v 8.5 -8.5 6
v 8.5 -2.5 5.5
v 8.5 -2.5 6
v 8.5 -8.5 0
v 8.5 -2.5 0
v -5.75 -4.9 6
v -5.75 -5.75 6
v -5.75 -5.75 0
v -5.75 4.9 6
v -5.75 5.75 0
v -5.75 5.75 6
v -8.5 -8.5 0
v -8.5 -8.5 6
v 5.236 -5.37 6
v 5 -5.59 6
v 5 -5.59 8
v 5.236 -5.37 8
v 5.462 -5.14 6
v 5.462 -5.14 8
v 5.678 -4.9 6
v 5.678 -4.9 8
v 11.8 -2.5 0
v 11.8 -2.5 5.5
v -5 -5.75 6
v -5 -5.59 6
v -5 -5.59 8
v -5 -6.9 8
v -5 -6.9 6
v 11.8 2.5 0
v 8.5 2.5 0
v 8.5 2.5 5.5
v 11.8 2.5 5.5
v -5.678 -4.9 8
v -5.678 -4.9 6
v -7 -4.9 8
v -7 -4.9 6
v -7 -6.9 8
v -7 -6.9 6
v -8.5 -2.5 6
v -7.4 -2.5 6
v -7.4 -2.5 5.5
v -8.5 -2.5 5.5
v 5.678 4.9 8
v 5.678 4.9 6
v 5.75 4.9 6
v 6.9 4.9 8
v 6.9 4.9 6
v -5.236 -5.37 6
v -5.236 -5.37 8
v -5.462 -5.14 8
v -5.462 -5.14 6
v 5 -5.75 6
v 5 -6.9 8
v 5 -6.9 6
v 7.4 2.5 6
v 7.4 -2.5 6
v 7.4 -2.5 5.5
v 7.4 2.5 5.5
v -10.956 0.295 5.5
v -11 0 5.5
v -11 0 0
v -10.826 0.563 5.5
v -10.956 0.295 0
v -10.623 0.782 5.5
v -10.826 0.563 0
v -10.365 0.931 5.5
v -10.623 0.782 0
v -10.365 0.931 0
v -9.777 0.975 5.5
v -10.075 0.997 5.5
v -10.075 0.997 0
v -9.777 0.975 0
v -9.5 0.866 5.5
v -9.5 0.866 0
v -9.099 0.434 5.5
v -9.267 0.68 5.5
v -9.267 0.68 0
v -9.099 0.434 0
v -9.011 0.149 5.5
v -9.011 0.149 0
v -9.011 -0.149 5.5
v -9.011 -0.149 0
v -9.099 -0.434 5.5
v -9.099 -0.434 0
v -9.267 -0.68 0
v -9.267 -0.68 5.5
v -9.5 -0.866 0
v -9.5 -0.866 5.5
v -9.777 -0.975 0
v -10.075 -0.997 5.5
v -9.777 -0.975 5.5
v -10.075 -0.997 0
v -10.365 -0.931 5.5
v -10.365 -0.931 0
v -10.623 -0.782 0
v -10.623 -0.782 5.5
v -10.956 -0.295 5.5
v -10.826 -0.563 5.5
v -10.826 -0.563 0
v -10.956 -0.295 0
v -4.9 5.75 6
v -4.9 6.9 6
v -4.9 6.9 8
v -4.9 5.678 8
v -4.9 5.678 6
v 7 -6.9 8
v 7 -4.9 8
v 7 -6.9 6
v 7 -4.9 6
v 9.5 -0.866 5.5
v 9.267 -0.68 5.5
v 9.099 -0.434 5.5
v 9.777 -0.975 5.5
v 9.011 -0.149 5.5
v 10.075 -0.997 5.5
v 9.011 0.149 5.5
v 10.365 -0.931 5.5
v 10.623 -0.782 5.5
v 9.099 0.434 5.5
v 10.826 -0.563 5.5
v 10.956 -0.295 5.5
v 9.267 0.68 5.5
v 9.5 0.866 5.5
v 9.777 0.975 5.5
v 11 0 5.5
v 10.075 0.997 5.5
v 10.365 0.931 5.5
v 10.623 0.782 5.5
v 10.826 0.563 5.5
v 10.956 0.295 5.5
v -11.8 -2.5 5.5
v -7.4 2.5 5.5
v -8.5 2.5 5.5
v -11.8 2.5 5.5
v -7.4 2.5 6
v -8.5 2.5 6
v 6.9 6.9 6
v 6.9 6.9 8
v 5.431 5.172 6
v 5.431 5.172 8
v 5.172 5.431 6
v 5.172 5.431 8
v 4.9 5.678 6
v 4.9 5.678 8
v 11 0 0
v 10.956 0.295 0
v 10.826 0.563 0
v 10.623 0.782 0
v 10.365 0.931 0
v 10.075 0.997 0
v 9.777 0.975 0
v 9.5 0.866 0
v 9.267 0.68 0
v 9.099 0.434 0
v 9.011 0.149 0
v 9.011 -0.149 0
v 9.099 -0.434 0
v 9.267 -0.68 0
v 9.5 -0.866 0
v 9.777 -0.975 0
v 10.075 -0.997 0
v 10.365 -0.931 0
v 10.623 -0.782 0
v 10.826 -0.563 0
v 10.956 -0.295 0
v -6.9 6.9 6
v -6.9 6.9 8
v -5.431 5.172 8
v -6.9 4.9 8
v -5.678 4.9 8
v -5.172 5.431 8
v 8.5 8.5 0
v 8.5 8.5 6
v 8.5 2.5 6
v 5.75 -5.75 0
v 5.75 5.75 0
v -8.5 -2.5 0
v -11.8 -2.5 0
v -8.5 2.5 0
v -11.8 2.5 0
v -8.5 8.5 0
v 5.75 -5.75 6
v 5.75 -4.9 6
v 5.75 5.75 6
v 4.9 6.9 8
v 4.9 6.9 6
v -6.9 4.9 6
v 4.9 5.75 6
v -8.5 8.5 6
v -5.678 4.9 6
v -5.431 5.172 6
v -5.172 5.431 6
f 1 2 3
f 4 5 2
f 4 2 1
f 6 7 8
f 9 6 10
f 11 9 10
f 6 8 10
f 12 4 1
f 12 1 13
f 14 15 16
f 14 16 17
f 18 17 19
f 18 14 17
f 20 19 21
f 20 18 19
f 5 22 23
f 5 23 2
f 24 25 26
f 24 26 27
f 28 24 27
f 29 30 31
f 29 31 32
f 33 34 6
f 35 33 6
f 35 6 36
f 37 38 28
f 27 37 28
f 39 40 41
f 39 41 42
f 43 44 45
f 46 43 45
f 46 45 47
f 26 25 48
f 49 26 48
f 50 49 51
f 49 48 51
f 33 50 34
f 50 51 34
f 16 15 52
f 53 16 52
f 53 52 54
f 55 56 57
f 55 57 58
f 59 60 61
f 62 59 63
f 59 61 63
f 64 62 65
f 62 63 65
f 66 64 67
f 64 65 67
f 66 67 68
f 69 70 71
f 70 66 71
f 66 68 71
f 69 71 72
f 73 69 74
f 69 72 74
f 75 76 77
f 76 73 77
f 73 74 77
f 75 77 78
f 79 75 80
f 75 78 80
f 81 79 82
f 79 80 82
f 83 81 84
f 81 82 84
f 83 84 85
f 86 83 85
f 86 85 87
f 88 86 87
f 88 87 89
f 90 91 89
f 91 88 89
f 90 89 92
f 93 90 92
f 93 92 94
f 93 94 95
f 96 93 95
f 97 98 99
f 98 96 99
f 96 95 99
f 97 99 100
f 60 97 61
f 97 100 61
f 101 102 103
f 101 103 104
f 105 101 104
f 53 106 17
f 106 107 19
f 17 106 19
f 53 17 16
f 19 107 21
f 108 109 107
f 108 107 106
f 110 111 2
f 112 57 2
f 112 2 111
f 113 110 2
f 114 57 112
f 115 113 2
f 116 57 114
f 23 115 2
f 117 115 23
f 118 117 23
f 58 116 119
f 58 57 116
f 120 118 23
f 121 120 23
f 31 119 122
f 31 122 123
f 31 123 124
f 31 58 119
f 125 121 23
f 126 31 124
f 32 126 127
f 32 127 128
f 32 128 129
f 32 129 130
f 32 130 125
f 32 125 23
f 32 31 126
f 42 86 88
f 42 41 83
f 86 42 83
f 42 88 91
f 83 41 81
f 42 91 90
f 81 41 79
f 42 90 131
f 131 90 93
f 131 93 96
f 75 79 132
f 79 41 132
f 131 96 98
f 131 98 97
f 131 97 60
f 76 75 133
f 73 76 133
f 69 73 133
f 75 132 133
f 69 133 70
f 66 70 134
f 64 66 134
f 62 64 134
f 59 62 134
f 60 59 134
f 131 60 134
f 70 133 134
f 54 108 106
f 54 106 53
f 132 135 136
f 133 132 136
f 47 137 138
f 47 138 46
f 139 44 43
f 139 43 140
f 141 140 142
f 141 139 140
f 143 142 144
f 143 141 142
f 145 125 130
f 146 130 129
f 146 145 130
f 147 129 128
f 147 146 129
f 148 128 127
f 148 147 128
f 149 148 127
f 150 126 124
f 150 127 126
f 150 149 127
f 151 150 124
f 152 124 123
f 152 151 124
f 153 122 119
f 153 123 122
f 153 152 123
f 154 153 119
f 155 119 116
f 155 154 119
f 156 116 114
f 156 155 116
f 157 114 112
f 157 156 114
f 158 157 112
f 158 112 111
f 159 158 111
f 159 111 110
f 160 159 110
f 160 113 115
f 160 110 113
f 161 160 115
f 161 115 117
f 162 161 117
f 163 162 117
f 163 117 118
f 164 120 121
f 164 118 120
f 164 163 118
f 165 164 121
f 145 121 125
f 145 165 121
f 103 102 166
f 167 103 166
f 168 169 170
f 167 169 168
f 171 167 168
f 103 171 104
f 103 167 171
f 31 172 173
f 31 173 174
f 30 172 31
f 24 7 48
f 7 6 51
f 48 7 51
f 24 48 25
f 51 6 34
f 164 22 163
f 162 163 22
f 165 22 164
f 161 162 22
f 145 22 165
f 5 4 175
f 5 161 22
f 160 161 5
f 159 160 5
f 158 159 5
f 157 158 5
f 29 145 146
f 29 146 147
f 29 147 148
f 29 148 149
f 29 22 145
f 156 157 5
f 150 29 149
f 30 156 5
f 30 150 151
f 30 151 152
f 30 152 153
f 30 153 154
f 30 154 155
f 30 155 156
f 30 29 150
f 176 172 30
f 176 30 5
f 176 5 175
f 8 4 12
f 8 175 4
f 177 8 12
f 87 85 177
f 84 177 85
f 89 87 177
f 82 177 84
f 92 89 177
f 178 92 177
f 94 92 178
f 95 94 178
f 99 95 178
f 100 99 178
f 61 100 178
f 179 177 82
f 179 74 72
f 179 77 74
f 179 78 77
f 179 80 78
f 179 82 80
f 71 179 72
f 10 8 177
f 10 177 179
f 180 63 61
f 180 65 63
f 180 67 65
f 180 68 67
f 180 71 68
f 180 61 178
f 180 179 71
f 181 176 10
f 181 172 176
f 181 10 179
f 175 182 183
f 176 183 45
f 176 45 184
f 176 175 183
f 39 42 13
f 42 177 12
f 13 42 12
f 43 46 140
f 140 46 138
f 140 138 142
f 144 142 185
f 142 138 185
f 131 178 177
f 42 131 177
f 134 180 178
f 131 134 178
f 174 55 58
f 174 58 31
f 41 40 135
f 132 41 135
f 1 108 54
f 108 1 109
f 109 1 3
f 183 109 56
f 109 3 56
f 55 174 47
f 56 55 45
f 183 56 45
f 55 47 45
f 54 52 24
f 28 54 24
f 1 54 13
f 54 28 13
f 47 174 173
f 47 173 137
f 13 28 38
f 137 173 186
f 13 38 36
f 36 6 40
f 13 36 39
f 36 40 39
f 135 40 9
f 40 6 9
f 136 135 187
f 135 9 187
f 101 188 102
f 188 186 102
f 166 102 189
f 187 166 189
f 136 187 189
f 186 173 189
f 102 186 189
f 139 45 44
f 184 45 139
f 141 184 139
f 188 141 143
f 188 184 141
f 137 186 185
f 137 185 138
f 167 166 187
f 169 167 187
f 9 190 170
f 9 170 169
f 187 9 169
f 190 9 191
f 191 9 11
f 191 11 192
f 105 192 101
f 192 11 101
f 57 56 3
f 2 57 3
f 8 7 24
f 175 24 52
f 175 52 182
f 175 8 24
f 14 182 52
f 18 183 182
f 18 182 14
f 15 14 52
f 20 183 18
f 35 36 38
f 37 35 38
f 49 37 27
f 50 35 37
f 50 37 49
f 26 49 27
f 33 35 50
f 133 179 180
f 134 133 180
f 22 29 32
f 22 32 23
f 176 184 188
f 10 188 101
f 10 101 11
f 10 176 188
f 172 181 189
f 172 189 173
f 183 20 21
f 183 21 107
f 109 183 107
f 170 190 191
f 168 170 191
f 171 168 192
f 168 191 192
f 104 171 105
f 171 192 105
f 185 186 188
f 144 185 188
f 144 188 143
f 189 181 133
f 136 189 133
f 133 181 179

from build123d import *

# Parameters (mm, degrees)
SKETCH002_R  = 1
PAD002_DEPTH = 30
PAD_DEPTH    = 6
PAD001_DEPTH = 2
SKETCH003_W  = 5
SKETCH003_H  = 5
POCKET_DEPTH = 0.5


with BuildPart() as screw_hole:
    # Sketch002 → Pad002 (new body)
    with BuildSketch(Plane.XY):
        with Locations((10, 0)):
            Circle(SKETCH002_R)
    extrude(amount=PAD002_DEPTH)


with BuildPart() as pocket:
    # Sketch → Pad (new body)
    with BuildSketch(Plane.XY):
        Polygon((0, 8.5), (8.5, 8.5), (8.5, 2.5), (11.8, 2.5), (11.8, -2.5), (8.5, -2.5), (8.5, -8.5), (0, -8.5), (0, -5.75), (5.75, -5.75), (5.75, 5.75), (0, 5.75), align=None)
    extrude(amount=PAD_DEPTH)

    # Sketch001 → Pad001 (new body)
    with BuildSketch(Plane.XY.offset(6)):
        with BuildLine():
            Line((4.9, 6.9), (6.9, 6.9))
            Line((6.9, 6.9), (6.9, 4.9))
            Line((5.678028, 4.9), (6.9, 4.9))
            ThreePointArc((5.678028, 4.9), (5.303301, 5.303301), (4.9, 5.678028))
            Line((4.9, 6.9), (4.9, 5.678028))
        make_face()
        with BuildLine():
            Line((7, -4.9), (7, -6.9))
            Line((7, -6.9), (5, -6.9))
            Line((5, -5.59017), (5, -6.9))
            ThreePointArc((5, -5.59017), (5.350155, -5.25603), (5.678028, -4.9))
            Line((5.678028, -4.9), (7, -4.9))
        make_face()
    extrude(amount=PAD001_DEPTH)

    # Cut: cut Screw Hole
    add(screw_hole.part, mode=Mode.SUBTRACT)

    # Sketch003 → Pocket (cut)
    with BuildSketch(Plane.XY.offset(6)):
        with Locations((9.9, 0)):
            Rectangle(SKETCH003_W, SKETCH003_H)
    extrude(amount=-POCKET_DEPTH, mode=Mode.SUBTRACT)


with BuildPart() as fusion:
    # Part__Mirroring: instance of Pocket
    add(pocket.part.mirror(Plane(origin=(0, 0, 0), x_dir=(0, -1, 0), z_dir=(1, 0, 0))))

    # Fusion: union Pocket
    add(pocket.part)


solid = fusion.part
